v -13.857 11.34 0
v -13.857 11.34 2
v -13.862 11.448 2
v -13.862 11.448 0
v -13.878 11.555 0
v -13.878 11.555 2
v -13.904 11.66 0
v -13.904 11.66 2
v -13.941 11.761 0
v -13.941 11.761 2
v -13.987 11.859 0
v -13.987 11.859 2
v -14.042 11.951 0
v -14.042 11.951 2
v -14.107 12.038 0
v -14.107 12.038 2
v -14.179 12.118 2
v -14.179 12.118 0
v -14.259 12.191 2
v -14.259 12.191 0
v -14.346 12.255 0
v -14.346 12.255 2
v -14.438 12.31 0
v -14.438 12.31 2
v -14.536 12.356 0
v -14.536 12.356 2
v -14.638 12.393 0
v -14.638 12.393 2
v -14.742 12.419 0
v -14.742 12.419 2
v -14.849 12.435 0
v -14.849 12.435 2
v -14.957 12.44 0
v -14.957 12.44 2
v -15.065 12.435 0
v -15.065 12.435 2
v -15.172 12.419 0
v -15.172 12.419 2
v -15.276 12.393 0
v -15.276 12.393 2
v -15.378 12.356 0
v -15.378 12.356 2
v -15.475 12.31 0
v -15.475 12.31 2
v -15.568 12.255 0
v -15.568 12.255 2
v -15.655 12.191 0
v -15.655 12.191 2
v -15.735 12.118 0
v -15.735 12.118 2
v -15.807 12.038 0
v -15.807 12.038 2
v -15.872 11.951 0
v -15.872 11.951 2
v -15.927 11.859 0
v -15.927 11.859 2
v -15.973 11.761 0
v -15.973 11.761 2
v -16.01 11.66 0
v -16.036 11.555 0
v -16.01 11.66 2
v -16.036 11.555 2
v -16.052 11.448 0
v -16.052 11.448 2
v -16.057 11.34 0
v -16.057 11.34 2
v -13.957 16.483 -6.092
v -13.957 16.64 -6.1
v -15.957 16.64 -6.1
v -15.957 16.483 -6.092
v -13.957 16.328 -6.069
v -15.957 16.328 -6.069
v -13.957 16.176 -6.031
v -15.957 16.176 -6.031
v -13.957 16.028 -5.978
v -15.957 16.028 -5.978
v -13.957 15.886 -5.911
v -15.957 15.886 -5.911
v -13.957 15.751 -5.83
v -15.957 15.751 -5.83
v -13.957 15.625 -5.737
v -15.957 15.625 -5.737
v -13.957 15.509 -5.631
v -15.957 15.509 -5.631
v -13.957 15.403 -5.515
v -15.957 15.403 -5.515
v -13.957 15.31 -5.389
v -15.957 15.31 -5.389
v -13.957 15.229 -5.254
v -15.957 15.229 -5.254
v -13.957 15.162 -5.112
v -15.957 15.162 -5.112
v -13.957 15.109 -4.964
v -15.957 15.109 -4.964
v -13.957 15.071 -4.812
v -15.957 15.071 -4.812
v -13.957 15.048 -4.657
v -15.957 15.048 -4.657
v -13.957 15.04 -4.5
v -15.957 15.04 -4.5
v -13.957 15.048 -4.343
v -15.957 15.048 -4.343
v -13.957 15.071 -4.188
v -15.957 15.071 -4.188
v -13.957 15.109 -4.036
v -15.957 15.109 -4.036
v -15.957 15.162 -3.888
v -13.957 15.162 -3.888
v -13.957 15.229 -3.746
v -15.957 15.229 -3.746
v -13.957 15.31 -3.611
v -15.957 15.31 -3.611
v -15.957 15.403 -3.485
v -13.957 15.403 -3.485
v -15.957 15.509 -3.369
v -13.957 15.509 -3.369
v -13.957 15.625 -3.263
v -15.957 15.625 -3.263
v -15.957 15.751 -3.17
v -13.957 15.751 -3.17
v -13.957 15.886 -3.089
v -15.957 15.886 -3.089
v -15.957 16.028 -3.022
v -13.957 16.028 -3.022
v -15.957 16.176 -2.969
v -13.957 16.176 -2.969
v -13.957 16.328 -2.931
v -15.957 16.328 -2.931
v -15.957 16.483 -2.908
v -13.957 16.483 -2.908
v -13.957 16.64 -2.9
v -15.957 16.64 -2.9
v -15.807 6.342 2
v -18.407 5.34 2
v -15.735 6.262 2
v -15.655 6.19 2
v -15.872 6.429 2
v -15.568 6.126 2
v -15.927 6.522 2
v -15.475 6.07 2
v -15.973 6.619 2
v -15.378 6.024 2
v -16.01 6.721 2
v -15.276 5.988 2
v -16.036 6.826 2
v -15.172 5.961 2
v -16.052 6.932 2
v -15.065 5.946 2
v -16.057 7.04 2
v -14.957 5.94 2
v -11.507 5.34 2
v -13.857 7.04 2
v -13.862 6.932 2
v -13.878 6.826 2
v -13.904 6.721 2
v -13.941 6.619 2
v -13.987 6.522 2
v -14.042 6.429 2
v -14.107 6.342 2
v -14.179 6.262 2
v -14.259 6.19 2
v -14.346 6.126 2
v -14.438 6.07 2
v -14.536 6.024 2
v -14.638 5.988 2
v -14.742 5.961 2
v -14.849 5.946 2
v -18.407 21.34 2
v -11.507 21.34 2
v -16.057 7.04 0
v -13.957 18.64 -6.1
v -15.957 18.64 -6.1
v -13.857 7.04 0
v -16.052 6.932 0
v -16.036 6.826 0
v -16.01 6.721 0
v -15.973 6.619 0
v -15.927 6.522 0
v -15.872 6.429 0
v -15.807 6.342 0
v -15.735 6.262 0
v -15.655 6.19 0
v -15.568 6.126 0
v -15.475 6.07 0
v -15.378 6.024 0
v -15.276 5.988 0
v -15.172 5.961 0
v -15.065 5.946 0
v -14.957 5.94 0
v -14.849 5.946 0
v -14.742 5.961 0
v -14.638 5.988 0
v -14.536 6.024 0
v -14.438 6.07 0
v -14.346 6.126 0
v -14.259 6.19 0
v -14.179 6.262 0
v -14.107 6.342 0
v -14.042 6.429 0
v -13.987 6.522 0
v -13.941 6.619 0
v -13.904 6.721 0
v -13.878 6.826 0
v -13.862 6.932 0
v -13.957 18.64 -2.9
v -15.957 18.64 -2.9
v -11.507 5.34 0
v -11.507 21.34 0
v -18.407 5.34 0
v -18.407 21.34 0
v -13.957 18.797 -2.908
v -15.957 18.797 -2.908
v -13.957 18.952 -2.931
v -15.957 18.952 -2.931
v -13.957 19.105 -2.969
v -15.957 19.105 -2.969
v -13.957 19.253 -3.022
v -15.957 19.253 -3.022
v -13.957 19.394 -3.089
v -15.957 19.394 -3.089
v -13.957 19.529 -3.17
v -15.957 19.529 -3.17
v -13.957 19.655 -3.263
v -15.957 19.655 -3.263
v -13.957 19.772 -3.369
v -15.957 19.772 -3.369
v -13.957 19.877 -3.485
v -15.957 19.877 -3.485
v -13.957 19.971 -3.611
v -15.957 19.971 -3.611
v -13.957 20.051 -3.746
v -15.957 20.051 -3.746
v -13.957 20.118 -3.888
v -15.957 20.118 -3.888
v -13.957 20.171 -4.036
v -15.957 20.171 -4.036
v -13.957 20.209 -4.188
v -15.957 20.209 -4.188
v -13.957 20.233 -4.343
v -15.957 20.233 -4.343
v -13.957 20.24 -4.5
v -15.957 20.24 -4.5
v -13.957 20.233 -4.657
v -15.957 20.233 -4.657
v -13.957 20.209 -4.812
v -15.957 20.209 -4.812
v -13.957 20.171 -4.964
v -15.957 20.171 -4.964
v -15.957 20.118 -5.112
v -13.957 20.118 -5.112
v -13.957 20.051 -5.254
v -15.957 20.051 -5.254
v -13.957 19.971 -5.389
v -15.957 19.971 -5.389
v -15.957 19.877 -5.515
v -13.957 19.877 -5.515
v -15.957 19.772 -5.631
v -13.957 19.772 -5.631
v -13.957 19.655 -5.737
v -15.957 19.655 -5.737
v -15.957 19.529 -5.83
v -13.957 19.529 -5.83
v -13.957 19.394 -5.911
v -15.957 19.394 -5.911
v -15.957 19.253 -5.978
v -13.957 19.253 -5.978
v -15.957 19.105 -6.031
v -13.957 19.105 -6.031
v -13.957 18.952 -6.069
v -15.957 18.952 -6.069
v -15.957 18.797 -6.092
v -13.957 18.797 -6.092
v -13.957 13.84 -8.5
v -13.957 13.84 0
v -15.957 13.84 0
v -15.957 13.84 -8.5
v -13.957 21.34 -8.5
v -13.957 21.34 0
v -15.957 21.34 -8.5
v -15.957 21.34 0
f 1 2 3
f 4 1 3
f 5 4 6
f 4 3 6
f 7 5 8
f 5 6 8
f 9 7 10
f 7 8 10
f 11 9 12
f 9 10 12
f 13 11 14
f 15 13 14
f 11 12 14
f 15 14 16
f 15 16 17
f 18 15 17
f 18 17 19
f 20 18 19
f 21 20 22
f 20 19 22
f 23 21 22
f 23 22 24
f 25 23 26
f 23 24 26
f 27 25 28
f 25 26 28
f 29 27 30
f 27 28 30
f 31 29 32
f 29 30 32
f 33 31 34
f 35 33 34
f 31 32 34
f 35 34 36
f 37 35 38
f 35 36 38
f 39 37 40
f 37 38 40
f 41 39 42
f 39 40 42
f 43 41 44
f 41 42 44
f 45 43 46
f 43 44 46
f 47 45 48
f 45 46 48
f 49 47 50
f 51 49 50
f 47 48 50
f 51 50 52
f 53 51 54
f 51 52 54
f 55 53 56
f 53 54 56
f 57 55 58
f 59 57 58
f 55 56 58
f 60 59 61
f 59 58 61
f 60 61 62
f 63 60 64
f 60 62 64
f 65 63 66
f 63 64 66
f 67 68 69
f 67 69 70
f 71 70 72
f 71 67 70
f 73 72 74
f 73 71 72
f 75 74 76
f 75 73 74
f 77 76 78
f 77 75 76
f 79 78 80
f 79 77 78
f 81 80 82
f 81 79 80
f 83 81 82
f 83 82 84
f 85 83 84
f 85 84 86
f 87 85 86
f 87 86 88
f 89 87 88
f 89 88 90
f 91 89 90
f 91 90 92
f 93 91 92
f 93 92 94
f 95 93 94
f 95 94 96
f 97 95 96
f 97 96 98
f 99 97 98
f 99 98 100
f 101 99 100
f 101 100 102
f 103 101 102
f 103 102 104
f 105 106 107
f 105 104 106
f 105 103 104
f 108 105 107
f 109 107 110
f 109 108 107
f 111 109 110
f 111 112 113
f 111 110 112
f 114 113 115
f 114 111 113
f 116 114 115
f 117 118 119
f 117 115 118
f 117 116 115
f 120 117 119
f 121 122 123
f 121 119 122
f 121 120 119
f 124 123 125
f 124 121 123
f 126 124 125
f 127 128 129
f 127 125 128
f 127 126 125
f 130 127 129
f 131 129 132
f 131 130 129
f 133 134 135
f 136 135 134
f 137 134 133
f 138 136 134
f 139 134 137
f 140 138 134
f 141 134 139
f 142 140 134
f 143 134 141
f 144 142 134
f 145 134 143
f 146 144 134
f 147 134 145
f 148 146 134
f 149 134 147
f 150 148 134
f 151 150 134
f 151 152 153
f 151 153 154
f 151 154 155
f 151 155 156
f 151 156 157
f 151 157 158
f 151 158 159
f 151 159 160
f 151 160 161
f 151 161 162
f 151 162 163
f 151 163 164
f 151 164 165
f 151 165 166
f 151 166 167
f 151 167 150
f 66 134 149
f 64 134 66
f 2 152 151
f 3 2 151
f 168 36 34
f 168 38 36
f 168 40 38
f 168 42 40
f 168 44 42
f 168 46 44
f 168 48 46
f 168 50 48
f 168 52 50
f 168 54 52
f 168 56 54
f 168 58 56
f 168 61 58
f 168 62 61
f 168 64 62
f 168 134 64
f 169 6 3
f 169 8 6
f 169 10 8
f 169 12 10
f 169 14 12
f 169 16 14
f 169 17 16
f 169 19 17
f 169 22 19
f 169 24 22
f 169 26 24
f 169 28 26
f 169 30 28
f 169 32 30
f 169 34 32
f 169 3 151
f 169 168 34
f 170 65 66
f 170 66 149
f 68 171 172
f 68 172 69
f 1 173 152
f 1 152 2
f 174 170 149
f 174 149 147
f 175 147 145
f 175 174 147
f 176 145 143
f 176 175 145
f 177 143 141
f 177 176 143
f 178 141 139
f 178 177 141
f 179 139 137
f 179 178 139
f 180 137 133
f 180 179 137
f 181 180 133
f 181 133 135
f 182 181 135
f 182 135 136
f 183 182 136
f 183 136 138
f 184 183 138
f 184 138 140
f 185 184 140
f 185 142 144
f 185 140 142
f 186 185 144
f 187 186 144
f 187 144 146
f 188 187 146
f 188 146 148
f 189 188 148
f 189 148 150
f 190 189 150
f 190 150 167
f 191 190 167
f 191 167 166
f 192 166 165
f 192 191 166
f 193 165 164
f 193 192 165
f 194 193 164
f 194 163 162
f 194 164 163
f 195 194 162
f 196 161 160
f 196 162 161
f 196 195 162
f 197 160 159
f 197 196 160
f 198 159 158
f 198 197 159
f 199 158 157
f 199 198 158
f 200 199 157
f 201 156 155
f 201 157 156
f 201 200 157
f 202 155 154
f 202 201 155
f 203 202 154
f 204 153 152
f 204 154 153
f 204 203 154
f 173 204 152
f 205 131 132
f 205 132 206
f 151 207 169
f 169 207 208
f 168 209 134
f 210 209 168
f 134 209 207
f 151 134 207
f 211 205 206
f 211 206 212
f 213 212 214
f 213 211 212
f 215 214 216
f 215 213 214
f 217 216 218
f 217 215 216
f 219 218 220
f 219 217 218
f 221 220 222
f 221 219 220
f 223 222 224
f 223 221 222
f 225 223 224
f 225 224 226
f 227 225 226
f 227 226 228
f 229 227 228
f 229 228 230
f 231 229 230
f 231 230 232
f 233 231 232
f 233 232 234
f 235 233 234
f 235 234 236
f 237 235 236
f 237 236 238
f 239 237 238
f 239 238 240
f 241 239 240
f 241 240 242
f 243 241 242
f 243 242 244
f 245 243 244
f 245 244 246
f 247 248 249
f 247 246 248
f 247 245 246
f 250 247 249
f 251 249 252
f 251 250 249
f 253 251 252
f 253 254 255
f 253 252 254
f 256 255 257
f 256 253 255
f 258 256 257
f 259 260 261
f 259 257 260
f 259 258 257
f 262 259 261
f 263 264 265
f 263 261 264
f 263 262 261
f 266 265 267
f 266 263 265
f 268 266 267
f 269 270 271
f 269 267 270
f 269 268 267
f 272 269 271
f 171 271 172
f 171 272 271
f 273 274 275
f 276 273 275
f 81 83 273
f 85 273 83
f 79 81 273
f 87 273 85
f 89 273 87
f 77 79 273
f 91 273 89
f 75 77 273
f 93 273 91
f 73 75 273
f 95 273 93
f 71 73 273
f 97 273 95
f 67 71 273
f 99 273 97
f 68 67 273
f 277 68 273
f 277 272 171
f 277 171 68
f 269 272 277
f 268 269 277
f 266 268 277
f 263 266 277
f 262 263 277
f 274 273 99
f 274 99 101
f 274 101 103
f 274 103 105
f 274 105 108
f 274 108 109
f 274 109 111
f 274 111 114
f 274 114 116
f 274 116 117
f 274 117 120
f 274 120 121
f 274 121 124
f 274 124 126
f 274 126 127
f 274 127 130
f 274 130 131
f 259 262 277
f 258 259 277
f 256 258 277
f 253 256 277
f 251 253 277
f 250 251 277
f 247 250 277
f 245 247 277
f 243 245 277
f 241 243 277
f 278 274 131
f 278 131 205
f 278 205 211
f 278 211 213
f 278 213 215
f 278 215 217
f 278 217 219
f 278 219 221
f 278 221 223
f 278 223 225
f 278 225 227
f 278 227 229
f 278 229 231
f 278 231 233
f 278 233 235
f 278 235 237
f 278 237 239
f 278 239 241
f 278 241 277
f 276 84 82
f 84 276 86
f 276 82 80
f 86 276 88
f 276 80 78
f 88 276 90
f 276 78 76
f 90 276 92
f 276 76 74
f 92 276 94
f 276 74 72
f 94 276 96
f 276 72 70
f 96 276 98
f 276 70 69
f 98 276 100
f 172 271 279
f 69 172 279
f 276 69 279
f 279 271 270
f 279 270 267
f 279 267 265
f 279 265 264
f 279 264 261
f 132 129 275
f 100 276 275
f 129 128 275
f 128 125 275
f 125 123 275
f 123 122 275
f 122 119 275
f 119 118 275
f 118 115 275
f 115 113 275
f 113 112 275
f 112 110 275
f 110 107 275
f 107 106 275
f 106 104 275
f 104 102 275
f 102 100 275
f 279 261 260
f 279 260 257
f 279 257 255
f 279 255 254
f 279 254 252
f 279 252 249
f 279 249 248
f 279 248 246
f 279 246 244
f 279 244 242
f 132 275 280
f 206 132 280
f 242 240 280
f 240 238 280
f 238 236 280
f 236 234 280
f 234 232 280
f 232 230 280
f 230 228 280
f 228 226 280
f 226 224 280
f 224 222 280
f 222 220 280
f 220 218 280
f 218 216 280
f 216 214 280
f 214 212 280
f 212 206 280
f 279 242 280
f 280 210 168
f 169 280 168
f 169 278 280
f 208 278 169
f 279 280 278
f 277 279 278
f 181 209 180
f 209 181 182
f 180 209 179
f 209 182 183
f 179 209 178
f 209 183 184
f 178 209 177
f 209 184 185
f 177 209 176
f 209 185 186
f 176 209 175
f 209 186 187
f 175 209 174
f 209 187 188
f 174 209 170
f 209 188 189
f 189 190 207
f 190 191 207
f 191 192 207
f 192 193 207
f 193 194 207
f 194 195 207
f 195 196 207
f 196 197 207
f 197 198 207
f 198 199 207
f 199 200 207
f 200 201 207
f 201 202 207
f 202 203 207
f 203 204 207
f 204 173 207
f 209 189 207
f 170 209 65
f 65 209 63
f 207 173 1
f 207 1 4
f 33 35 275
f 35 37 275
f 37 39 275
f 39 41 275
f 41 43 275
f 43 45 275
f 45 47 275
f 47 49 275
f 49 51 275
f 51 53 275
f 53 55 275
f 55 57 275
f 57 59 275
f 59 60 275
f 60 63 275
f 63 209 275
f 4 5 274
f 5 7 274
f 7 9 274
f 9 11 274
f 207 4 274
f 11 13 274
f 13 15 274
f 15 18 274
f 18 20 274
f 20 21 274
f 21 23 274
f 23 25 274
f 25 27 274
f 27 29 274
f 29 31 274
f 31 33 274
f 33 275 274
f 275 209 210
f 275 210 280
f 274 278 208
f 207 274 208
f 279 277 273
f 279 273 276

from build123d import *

# Parameters (mm, degrees)
SKETCH7_W                      = 7
SKETCH7_H                      = 16
BOSS_EXTRUDE6_DEPTH            = 2
SKETCH8_W                      = 2
SKETCH8_H                      = 7.5
BOSS_EXTRUDE7_DEPTH            = 8.5
F_2_2_2_2_DIAMETER_HOLE1_D     = 2.2
F_2_2_2_2_DIAMETER_HOLE1_DEPTH = 2
CUT_EXTRUDE3_DEPTH             = 5.5
CUT_EXTRUDE5_DEPTH             = 10
SKETCH18_W                     = 0.05
SKETCH18_H                     = 16
CUT_EXTRUDE6_DEPTH             = 3


with BuildPart() as part:
    # Sketch7 → Boss-Extrude6 (new body)
    with BuildSketch(Plane.XY):
        with Locations((-14.956904704, 13.340209502)):
            Rectangle(SKETCH7_W, SKETCH7_H)
    extrude(amount=BOSS_EXTRUDE6_DEPTH)

    # Sketch8 → Boss-Extrude7 (add)
    with BuildSketch(Plane(origin=(0, 0, 0), x_dir=(-1, 0, 0), z_dir=(0, 0, -1))):
        with Locations((14.956904704, 17.590209502)):
            Rectangle(SKETCH8_W, SKETCH8_H)
    extrude(amount=BOSS_EXTRUDE7_DEPTH)

    # Ø2.2 (2.2) Diameter Hole1
    with Locations(Plane(origin=(0, 0, 0), x_dir=(-1, 0, 0), z_dir=(0, 0, -1))):
        with Locations((14.956904704, 11.340209502)):
            Hole(F_2_2_2_2_DIAMETER_HOLE1_D / 2, depth=F_2_2_2_2_DIAMETER_HOLE1_DEPTH)

    # Sketch15 → Cut-Extrude3 (cut, through all)
    with BuildSketch(Plane(origin=(-13.956904704, 0, 0), x_dir=(0, 0, -1), z_dir=(1, 0, 0))):
        with BuildLine():
            Line((2.9, 16.640209502), (2.9, 18.640209502))
            ThreePointArc((2.9, 18.640209502), (4.5, 20.240209502), (6.1, 18.640209502))
            Line((6.1, 18.640209502), (6.1, 16.640209502))
            ThreePointArc((6.1, 16.640209502), (4.5, 15.040209502), (2.9, 16.640209502))
        make_face()
    extrude(amount=-CUT_EXTRUDE3_DEPTH, mode=Mode.SUBTRACT)

    # Sketch17 → Cut-Extrude5 (cut)
    with BuildSketch(Plane(origin=(0, 0, 0), x_dir=(-1, 0, 0), z_dir=(0, 0, -1))):
        with BuildLine():
            Line((13.856904704, 7.040209502), (13.856904704, 11.340209502))
            Line((13.856904704, 11.340209502), (16.056904704, 11.340209502))
            Line((16.056904704, 11.340209502), (16.056904704, 7.040209502))
            ThreePointArc((16.056904704, 7.040209502), (14.956904704, 5.940209502), (13.856904704, 7.040209502))
        make_face()
    extrude(amount=-CUT_EXTRUDE5_DEPTH, mode=Mode.SUBTRACT)

    # Sketch18 → Cut-Extrude6 (cut, through all)
    with BuildSketch(Plane(origin=(0, 0, 0), x_dir=(-1, 0, 0), z_dir=(0, 0, -1))):
        with Locations((11.481904704, 13.340209502)):
            Rectangle(SKETCH18_W, SKETCH18_H)
        with Locations((18.431904704, 13.340209502)):
            Rectangle(SKETCH18_W, SKETCH18_H)
    extrude(amount=-CUT_EXTRUDE6_DEPTH, mode=Mode.SUBTRACT)


solid = part.part
